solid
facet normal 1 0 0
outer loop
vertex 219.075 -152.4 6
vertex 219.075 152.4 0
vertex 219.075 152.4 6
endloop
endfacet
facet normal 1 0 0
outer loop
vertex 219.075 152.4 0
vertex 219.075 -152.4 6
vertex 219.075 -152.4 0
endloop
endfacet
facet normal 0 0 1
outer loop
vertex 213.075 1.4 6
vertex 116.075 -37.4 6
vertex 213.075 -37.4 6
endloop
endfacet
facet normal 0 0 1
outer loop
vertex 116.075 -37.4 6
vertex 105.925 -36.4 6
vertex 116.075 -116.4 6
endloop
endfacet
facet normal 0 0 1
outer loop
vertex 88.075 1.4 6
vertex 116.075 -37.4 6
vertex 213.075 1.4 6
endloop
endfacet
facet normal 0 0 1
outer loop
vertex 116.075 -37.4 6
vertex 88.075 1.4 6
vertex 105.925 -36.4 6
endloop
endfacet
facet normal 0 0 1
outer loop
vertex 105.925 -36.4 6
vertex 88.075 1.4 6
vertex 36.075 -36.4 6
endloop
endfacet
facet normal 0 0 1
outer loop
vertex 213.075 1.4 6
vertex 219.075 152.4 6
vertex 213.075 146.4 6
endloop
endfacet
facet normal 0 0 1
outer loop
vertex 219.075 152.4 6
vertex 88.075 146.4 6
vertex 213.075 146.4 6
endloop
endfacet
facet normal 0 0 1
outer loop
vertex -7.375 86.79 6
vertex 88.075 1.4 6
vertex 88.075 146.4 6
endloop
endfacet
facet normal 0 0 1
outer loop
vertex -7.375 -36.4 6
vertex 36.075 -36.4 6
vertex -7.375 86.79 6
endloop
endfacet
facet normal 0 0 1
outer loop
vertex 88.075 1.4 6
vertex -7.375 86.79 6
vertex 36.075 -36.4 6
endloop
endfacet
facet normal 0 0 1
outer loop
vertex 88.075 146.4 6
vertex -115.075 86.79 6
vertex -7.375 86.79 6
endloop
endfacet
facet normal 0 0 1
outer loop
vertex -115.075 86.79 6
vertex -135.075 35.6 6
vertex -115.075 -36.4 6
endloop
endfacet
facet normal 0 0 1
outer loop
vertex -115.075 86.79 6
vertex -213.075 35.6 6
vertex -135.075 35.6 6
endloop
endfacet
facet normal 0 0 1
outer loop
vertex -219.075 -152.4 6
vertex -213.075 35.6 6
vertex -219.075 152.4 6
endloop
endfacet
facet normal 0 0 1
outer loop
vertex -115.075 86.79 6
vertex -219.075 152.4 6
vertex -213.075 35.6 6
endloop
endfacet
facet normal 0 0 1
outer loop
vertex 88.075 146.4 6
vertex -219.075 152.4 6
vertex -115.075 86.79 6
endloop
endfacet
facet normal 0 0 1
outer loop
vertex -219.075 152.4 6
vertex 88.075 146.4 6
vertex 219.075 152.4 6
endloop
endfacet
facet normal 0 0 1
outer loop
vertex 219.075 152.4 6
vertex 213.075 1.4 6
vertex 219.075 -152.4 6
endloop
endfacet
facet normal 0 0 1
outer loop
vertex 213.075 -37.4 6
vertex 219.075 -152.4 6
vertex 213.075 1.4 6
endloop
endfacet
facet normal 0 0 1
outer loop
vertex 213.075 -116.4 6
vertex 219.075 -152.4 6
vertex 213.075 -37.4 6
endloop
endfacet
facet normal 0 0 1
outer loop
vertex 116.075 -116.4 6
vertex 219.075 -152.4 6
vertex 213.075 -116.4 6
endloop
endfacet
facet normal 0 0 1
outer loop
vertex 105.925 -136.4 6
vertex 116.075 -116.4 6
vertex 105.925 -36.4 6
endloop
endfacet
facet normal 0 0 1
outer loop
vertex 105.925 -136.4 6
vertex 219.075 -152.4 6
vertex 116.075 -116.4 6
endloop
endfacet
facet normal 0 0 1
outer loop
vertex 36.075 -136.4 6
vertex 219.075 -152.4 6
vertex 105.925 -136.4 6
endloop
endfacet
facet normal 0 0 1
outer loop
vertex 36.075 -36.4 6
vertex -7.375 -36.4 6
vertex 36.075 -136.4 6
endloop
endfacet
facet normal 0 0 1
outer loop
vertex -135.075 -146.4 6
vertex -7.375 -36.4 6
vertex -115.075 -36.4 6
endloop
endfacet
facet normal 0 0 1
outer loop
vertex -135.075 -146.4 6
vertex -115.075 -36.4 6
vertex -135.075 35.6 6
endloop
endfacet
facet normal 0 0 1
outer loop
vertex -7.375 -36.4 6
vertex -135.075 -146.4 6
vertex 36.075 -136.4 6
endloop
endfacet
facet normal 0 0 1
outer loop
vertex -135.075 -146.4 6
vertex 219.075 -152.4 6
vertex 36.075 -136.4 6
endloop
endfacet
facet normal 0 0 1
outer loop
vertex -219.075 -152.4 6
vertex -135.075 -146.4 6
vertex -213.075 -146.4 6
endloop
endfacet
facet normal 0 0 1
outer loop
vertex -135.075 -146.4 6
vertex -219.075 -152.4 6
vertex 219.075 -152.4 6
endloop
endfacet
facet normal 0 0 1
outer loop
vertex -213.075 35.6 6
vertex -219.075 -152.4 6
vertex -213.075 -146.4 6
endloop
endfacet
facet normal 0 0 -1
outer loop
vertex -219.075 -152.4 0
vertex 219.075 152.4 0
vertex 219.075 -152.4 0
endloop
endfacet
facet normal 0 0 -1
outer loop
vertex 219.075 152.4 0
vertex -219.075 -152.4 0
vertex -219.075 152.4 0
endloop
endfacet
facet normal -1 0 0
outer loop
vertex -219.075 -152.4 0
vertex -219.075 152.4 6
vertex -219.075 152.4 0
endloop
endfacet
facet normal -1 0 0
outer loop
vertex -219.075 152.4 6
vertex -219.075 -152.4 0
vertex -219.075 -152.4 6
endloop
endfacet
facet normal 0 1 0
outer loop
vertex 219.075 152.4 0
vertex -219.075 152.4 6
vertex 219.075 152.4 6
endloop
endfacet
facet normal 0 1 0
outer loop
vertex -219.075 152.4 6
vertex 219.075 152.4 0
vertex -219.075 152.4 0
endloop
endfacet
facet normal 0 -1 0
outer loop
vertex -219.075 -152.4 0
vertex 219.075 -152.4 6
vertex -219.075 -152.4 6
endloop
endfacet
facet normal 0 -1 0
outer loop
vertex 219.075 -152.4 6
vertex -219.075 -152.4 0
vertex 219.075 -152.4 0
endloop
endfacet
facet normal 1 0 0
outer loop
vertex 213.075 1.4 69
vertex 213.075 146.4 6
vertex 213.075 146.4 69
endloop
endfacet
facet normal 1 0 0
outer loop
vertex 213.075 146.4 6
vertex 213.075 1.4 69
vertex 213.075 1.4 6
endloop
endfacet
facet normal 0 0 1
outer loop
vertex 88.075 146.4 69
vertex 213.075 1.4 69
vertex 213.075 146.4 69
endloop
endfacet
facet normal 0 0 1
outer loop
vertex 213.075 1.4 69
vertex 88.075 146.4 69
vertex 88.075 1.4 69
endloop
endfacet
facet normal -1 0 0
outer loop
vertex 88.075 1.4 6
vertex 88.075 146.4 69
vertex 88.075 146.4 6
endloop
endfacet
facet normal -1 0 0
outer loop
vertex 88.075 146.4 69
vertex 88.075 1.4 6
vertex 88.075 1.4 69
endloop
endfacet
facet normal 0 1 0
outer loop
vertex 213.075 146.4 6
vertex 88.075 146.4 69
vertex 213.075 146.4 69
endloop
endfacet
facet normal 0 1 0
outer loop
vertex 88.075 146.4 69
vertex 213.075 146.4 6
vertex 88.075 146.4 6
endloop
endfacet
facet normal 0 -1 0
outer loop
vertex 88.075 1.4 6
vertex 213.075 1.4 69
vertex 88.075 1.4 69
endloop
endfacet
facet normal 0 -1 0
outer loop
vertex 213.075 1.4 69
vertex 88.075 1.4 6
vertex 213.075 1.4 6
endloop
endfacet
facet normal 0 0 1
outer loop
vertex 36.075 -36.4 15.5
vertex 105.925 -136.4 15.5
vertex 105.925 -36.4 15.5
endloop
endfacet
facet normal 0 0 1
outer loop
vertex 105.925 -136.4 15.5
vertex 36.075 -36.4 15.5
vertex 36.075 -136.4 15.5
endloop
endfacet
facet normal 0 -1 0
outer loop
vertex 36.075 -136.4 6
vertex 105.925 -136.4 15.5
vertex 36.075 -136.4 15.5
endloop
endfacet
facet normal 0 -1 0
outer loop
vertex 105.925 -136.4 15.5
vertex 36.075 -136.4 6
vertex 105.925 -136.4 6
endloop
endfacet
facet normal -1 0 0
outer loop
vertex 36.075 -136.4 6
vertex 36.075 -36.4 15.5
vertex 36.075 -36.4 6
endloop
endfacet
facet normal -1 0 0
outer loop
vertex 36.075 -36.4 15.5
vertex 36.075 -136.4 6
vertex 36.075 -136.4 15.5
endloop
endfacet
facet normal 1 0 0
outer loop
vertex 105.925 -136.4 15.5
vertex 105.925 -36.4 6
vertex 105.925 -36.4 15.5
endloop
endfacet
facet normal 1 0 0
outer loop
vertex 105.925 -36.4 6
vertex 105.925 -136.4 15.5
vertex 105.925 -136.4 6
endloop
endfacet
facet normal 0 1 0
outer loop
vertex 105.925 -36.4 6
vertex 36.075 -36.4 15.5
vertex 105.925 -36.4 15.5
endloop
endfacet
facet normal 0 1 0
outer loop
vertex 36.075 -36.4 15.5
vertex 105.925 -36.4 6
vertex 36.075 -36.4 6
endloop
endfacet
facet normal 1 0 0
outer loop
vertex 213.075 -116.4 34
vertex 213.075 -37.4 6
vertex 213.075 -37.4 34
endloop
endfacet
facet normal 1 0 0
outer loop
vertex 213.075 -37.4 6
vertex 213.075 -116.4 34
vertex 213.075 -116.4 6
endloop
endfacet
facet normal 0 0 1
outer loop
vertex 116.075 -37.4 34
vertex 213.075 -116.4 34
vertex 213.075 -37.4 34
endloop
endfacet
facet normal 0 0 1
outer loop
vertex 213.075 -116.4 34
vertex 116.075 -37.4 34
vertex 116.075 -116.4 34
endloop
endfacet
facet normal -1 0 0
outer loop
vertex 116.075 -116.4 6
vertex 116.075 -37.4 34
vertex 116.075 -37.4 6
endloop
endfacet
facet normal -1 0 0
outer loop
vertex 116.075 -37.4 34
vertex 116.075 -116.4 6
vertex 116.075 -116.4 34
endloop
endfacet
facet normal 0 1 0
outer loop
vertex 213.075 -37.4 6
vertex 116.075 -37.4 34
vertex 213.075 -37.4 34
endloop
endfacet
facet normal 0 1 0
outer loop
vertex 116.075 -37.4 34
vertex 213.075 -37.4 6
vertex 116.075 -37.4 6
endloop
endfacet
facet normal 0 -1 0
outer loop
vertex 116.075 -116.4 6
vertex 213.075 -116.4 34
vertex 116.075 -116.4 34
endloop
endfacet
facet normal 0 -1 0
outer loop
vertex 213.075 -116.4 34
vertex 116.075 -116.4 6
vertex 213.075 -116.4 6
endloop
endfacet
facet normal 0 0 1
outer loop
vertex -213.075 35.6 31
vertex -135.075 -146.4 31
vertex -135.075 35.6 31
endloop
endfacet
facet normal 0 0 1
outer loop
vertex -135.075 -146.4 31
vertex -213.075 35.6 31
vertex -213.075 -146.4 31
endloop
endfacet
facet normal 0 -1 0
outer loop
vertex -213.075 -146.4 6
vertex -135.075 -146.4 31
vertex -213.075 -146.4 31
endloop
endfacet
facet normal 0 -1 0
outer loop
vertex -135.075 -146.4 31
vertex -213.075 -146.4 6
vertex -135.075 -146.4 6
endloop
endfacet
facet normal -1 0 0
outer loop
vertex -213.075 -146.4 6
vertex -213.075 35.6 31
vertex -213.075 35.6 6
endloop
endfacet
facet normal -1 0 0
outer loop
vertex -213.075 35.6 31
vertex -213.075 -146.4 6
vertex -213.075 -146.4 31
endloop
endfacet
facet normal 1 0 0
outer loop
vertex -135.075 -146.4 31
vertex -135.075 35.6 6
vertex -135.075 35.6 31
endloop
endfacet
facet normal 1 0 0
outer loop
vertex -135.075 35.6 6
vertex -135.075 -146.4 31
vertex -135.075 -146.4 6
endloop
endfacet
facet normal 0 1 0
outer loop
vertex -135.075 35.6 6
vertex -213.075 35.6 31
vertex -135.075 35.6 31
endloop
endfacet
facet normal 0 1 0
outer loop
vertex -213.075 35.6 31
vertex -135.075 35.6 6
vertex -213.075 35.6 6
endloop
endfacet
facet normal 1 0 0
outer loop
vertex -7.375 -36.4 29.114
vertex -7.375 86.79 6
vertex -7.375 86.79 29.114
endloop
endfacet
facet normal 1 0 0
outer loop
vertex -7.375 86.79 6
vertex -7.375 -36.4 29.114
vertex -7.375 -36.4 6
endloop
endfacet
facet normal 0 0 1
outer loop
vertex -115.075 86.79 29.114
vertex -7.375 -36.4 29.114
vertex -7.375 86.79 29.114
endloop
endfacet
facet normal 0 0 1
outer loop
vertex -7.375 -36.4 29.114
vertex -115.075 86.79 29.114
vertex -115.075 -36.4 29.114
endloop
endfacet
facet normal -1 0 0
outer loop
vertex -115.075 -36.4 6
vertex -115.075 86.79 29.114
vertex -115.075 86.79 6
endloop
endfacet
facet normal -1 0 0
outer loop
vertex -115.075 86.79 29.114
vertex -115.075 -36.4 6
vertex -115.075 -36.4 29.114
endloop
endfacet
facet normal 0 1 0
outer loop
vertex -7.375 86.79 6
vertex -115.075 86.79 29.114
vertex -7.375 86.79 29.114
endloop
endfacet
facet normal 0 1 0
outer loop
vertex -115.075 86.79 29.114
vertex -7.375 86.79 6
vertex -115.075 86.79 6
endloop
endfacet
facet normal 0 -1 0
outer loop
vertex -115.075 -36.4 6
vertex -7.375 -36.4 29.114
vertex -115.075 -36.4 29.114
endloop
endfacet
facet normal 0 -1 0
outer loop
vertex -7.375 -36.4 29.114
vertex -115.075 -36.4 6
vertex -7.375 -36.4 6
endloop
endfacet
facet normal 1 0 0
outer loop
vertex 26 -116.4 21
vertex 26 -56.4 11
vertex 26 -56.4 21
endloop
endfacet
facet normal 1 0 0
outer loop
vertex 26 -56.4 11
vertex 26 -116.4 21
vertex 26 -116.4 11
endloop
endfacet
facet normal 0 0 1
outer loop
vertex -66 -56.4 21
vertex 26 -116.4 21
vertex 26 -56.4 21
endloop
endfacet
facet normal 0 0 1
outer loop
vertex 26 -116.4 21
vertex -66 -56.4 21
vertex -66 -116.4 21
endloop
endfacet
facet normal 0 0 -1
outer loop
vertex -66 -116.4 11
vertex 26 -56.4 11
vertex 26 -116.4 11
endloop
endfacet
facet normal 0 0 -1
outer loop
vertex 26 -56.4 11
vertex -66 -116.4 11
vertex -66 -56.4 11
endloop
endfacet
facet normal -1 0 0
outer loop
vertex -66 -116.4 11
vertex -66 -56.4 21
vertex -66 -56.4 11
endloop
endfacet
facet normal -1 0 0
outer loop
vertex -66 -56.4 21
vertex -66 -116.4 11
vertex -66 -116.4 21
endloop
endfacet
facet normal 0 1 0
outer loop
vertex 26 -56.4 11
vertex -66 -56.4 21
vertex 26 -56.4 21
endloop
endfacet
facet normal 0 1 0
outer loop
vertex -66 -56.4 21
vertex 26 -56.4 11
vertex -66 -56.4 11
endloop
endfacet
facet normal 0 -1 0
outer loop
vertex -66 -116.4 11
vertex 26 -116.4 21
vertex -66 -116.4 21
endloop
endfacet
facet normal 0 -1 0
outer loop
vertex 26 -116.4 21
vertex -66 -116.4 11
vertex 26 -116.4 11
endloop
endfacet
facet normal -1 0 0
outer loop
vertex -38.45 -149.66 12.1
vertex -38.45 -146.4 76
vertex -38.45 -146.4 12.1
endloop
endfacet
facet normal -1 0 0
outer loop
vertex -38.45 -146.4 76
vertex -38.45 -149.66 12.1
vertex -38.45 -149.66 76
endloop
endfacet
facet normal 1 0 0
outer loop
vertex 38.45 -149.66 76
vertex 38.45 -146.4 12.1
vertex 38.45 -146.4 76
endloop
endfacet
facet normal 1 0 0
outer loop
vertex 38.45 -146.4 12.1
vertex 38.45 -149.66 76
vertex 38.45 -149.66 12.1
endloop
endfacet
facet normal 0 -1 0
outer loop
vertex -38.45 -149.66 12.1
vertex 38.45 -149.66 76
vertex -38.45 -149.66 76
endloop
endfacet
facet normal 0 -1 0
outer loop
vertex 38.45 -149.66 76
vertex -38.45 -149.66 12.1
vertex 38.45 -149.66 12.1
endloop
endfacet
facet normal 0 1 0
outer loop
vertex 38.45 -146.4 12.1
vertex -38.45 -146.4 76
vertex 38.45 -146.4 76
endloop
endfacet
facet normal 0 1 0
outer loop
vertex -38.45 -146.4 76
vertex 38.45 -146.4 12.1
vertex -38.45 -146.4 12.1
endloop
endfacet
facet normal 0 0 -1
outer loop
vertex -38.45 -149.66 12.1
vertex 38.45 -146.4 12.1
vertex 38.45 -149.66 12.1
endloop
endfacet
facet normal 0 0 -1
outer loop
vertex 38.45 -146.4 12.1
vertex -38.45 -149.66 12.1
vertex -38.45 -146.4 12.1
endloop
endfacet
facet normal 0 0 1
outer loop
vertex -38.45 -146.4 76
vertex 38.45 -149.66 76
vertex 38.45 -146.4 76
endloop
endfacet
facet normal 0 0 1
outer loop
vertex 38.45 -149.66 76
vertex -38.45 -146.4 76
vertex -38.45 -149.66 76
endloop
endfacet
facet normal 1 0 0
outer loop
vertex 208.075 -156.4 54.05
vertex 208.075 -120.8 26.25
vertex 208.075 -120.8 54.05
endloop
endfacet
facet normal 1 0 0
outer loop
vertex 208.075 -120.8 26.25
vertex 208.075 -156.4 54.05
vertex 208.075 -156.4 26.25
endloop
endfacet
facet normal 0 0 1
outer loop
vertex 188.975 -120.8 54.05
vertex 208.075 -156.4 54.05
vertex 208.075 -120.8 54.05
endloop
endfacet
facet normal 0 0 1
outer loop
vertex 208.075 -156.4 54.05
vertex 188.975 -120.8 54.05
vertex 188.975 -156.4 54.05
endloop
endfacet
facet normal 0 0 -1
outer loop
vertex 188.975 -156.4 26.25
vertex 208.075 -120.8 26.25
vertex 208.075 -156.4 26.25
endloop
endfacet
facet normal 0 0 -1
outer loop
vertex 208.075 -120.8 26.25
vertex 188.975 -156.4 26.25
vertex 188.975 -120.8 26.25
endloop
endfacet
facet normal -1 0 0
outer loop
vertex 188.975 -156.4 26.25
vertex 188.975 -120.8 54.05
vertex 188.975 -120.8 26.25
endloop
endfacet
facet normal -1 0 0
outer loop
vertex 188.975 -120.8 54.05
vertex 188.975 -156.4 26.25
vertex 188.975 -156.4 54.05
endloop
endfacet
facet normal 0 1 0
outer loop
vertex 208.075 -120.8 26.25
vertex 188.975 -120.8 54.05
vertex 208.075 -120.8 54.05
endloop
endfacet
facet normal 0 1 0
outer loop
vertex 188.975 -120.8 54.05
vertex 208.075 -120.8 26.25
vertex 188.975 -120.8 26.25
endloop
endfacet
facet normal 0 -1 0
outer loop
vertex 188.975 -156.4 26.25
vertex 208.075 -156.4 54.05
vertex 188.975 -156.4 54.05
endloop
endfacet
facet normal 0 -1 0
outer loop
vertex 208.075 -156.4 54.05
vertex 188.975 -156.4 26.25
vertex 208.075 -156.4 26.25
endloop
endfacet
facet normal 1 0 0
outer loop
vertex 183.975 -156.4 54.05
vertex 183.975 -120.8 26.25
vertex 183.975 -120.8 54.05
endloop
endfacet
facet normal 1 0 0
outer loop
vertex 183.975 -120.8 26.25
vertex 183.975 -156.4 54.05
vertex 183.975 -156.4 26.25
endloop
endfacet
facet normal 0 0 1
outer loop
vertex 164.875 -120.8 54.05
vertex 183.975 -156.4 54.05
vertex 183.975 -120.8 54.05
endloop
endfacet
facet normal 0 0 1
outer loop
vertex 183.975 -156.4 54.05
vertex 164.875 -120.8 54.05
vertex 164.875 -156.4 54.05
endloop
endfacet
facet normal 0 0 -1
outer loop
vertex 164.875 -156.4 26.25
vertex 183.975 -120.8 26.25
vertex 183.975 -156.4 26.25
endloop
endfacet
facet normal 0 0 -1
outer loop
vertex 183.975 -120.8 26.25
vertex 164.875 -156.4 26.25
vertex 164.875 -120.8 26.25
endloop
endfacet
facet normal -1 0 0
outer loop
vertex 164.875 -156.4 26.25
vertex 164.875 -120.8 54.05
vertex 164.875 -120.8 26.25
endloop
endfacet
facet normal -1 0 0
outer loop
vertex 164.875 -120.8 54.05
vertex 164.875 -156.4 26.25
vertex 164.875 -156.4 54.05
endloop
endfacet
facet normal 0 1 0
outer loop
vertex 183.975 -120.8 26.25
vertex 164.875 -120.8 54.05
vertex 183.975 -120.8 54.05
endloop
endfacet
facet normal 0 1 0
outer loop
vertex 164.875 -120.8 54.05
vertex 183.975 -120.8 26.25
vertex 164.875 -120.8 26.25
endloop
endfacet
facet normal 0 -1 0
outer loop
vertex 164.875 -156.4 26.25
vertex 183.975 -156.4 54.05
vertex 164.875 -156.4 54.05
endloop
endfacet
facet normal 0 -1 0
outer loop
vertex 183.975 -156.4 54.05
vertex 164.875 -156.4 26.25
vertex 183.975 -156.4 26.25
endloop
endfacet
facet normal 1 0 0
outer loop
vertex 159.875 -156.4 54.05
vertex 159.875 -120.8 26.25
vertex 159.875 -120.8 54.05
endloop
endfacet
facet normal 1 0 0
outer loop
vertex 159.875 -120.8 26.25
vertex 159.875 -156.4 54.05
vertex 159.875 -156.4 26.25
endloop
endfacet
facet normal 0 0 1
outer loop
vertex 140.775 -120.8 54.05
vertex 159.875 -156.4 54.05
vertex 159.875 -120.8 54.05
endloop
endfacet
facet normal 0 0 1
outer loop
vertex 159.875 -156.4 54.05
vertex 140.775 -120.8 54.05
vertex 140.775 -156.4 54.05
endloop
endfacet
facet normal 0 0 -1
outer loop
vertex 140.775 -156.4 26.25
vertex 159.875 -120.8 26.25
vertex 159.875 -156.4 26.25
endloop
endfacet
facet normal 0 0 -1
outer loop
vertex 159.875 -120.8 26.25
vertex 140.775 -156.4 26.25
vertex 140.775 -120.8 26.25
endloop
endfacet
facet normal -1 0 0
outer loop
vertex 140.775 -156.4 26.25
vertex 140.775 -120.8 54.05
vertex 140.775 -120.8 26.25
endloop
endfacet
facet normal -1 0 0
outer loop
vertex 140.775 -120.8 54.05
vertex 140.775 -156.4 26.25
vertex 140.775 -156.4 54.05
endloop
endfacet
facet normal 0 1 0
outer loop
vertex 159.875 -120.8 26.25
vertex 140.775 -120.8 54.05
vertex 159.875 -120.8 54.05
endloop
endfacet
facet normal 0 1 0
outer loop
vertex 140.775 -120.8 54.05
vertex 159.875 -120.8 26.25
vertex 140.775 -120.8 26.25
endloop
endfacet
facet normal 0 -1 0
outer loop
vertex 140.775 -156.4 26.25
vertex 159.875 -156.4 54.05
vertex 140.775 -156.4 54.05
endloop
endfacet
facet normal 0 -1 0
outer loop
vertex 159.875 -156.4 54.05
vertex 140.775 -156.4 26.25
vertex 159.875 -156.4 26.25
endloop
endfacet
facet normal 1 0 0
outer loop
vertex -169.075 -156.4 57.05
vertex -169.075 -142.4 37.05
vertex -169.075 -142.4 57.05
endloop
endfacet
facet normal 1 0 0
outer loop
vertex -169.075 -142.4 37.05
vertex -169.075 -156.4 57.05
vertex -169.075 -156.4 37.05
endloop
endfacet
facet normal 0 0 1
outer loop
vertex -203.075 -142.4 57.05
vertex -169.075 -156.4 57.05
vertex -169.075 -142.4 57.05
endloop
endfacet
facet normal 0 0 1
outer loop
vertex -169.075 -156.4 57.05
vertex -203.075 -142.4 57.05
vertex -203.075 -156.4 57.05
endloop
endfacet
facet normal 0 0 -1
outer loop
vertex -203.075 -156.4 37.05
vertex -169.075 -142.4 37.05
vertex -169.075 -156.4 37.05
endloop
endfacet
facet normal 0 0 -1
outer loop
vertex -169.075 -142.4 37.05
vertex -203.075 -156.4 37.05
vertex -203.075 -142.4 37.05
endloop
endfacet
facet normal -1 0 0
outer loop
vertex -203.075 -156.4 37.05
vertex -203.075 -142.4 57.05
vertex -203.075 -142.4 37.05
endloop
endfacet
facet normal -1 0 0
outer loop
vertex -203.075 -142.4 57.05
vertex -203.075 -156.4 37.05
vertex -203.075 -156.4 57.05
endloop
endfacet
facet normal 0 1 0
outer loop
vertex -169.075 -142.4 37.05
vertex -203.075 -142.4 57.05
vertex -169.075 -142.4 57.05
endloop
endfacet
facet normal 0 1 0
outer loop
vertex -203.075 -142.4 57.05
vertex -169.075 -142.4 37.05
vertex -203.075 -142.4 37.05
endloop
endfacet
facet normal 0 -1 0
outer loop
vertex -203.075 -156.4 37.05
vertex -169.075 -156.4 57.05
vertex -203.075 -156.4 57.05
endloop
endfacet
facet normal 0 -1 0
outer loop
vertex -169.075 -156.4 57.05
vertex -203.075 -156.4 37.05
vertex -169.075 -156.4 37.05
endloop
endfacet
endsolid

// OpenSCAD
//Global case size variables
acrylic=6;
case_width=438.15;//17.25" rack unit width
case_height=88.1;//2U rack height
case_depth=304.8;//1/2 24" rack depth

//Case panels: naive approximations for now
front_panel_height=case_height-2*acrylic;
module front_panel(){
    cube([case_width,front_panel_height,acrylic]);
}

module back_panel(){
    back_panel_height=front_panel_height;
    cube([case_width,back_panel_height,acrylic]);
}

module top_panel(){
    cube([case_width, case_depth, acrylic]);
}

module bottom_panel(){
    color("black") cube([case_width, case_depth, acrylic]);
}

module side_panel(){
    cube([case_depth-2*acrylic,case_height-2*acrylic,acrylic]); 
}

// Parts inside the case
// These need to stay global because they're used in the scene as well.
psu_width=125;
psu_height=63;
psu_depth=145;

module psu(){
    color("red")
        cube([psu_width,psu_depth,psu_height]);
    translate([psu_width/2, psu_depth/2, psu_height])
        color("yellow") {
            text(halign="center", valign="center", text="PSU");
       }
}

module ssd_25_inch(){
    //9.5mm is most common
    width=100;
    depth=69.85;
    height=9.5;
    color("green")
        cube([width,depth,height]);
    translate([width/2, depth/2, height])
        color("yellow") {
            text(halign="center", valign="center", text="SSD");
        }
}

ethernet_switch_width=97;
ethernet_switch_depth=79;
ethernet_switch_height=28;
module ethernet_switch(){
    color("red")
        cube([ethernet_switch_width,ethernet_switch_depth,ethernet_switch_height]);
    translate([ethernet_switch_width/2, ethernet_switch_depth/2, ethernet_switch_height])
        color("yellow") {
            text(halign="center", valign="center", text="Ethernet");
        }
}

module vga_splitter(){
    //approximation
    width=66;
    depth=61;
    height=23;
    color("red")
        cube([width,depth,height]);
    translate([width/2, depth/2, height])
        color("yellow") {
            text(halign="center", valign="center", text="VGA Split");
        }
}

vga_hdmi_converter_width=182;
vga_hdmi_converter_depth=78;
vga_hdmi_converter_height=25;
module vga_hdmi_converter(){
    color("pink")
        cube([vga_hdmi_converter_width,vga_hdmi_converter_depth,vga_hdmi_converter_height]);
    translate([vga_hdmi_converter_width/2, vga_hdmi_converter_depth/2, vga_hdmi_converter_height])
        color("black") {
            text(halign="center", valign="center", text="VGA->HDMI");
        }
}

module h264_encoder(){
    width=107.70;
    depth=123.19;
    height=23.114;
    color("purple")
        cube([width,depth,height]);
    translate([width/2, depth/2, height])
        color("yellow") {
            text(halign="center", valign="center", text="H264 Enc.");
        }
}

banana_pi_width=92;
banana_pi_depth=60;
banana_pi_height=10; //just a wild guess for now
module banana_pi(){
    color("yellow")
        cube([banana_pi_width,banana_pi_depth,banana_pi_height]);
    translate([banana_pi_width/2, banana_pi_depth/2, banana_pi_height])
        color("red") {
            text(halign="center", valign="center", text="BPI");
        }
}

lcd_width=76.9;
lcd_height_nt=63.9;
lcd_height_t=65.3;
lcd_depth=3.26;
// Setting these so we can just change it here
lcd_height = lcd_height_nt;
// lcd_height = lcd_height_t;
module banana_pi_lcd(){
    color("blue")
        cube([lcd_width,lcd_height,lcd_depth]); //non-touch
    translate([lcd_width/2, lcd_height/2, lcd_depth])
        color("yellow") {
            text(halign="center", valign="center", text="LCD");
        }

}

ethernet_coupler_width=19.1;
ethernet_coupler_height=35.6;
ethernet_coupler_depth=27.8;
module ethernet_coupler(){
    //just an example from http://www.l-com.com/multimedia/eng_drawings/ECF504-C5.pdf
    color("red")
        cube([ethernet_coupler_width,ethernet_coupler_height,ethernet_coupler_depth]);
    translate([ethernet_coupler_width/2, ethernet_coupler_height/2, ethernet_coupler_depth])
        color("yellow") {
            text(halign="center", valign="center", size=5, text="RJ45");
        }
}

vga_coupler_width=34;
vga_coupler_height=14;
vga_coupler_depth=20;
module vga_coupler(){
    //just an example for now from http://www.datapro.net/products/vga-panel-mounting-coupler.html
    color("red")
        cube([vga_coupler_width,vga_coupler_height,vga_coupler_depth]);
    translate([vga_coupler_width/2, vga_coupler_height/2, vga_coupler_depth])
        color("yellow") {
            text(halign="center", valign="center", size=5, text="VGA");
        }
}

//Let's build the case
translate([-case_width/2, -case_depth/2, 0]) {
    //Panels
    bottom_panel();
    % translate([0,0,case_height-acrylic])
        top_panel();
    % translate([0,acrylic,acrylic])
        rotate([90,0,0])
            front_panel();
    % translate([0,case_depth,acrylic])
        rotate([90,0,0])
            back_panel();
    % translate([0,acrylic,acrylic])
        rotate([90,0,90])
            side_panel();
    % translate([case_width-acrylic,acrylic,acrylic])
        rotate([90,0,90])
            side_panel();
    
    //Parts inside the case
    translate([case_width-psu_width-acrylic,case_depth-psu_depth-acrylic,acrylic])
        psu();
    translate([325,acrylic+10,0])
        rotate([0,0,90])
            translate([0,0,acrylic])
                ssd_25_inch();
    translate([case_width-ethernet_switch_width-acrylic,acrylic+30,acrylic])
        ethernet_switch();
    // translate([??,??,??])
    //     vga_splitter();
    translate([vga_hdmi_converter_depth+acrylic,acrylic,acrylic])
        rotate([0,0,90])
            vga_hdmi_converter();
    translate([acrylic+vga_hdmi_converter_depth+20,acrylic+110,acrylic])
        h264_encoder();
    translate([(case_width-banana_pi_width)/2-20, acrylic+30, acrylic+5])
        banana_pi();
    translate([(case_width-lcd_width)/2,acrylic,acrylic+(front_panel_height-lcd_height)/2])
        rotate([90,0,0])
            banana_pi_lcd();
    translate([case_width-acrylic -(ethernet_coupler_width+5),-4,acrylic+(front_panel_height-ethernet_coupler_height)/2])
        ethernet_coupler();
    translate([case_width- acrylic - 2*(ethernet_coupler_width+5),-4,acrylic+(front_panel_height-ethernet_coupler_height)/2])
        ethernet_coupler();
    translate([case_width- acrylic - 3*(ethernet_coupler_width+5),-4,acrylic+(front_panel_height-ethernet_coupler_height)/2])
        ethernet_coupler();
    translate([acrylic + 10,-4,acrylic+(front_panel_height-vga_coupler_height)/2])
        vga_coupler();
    
}
